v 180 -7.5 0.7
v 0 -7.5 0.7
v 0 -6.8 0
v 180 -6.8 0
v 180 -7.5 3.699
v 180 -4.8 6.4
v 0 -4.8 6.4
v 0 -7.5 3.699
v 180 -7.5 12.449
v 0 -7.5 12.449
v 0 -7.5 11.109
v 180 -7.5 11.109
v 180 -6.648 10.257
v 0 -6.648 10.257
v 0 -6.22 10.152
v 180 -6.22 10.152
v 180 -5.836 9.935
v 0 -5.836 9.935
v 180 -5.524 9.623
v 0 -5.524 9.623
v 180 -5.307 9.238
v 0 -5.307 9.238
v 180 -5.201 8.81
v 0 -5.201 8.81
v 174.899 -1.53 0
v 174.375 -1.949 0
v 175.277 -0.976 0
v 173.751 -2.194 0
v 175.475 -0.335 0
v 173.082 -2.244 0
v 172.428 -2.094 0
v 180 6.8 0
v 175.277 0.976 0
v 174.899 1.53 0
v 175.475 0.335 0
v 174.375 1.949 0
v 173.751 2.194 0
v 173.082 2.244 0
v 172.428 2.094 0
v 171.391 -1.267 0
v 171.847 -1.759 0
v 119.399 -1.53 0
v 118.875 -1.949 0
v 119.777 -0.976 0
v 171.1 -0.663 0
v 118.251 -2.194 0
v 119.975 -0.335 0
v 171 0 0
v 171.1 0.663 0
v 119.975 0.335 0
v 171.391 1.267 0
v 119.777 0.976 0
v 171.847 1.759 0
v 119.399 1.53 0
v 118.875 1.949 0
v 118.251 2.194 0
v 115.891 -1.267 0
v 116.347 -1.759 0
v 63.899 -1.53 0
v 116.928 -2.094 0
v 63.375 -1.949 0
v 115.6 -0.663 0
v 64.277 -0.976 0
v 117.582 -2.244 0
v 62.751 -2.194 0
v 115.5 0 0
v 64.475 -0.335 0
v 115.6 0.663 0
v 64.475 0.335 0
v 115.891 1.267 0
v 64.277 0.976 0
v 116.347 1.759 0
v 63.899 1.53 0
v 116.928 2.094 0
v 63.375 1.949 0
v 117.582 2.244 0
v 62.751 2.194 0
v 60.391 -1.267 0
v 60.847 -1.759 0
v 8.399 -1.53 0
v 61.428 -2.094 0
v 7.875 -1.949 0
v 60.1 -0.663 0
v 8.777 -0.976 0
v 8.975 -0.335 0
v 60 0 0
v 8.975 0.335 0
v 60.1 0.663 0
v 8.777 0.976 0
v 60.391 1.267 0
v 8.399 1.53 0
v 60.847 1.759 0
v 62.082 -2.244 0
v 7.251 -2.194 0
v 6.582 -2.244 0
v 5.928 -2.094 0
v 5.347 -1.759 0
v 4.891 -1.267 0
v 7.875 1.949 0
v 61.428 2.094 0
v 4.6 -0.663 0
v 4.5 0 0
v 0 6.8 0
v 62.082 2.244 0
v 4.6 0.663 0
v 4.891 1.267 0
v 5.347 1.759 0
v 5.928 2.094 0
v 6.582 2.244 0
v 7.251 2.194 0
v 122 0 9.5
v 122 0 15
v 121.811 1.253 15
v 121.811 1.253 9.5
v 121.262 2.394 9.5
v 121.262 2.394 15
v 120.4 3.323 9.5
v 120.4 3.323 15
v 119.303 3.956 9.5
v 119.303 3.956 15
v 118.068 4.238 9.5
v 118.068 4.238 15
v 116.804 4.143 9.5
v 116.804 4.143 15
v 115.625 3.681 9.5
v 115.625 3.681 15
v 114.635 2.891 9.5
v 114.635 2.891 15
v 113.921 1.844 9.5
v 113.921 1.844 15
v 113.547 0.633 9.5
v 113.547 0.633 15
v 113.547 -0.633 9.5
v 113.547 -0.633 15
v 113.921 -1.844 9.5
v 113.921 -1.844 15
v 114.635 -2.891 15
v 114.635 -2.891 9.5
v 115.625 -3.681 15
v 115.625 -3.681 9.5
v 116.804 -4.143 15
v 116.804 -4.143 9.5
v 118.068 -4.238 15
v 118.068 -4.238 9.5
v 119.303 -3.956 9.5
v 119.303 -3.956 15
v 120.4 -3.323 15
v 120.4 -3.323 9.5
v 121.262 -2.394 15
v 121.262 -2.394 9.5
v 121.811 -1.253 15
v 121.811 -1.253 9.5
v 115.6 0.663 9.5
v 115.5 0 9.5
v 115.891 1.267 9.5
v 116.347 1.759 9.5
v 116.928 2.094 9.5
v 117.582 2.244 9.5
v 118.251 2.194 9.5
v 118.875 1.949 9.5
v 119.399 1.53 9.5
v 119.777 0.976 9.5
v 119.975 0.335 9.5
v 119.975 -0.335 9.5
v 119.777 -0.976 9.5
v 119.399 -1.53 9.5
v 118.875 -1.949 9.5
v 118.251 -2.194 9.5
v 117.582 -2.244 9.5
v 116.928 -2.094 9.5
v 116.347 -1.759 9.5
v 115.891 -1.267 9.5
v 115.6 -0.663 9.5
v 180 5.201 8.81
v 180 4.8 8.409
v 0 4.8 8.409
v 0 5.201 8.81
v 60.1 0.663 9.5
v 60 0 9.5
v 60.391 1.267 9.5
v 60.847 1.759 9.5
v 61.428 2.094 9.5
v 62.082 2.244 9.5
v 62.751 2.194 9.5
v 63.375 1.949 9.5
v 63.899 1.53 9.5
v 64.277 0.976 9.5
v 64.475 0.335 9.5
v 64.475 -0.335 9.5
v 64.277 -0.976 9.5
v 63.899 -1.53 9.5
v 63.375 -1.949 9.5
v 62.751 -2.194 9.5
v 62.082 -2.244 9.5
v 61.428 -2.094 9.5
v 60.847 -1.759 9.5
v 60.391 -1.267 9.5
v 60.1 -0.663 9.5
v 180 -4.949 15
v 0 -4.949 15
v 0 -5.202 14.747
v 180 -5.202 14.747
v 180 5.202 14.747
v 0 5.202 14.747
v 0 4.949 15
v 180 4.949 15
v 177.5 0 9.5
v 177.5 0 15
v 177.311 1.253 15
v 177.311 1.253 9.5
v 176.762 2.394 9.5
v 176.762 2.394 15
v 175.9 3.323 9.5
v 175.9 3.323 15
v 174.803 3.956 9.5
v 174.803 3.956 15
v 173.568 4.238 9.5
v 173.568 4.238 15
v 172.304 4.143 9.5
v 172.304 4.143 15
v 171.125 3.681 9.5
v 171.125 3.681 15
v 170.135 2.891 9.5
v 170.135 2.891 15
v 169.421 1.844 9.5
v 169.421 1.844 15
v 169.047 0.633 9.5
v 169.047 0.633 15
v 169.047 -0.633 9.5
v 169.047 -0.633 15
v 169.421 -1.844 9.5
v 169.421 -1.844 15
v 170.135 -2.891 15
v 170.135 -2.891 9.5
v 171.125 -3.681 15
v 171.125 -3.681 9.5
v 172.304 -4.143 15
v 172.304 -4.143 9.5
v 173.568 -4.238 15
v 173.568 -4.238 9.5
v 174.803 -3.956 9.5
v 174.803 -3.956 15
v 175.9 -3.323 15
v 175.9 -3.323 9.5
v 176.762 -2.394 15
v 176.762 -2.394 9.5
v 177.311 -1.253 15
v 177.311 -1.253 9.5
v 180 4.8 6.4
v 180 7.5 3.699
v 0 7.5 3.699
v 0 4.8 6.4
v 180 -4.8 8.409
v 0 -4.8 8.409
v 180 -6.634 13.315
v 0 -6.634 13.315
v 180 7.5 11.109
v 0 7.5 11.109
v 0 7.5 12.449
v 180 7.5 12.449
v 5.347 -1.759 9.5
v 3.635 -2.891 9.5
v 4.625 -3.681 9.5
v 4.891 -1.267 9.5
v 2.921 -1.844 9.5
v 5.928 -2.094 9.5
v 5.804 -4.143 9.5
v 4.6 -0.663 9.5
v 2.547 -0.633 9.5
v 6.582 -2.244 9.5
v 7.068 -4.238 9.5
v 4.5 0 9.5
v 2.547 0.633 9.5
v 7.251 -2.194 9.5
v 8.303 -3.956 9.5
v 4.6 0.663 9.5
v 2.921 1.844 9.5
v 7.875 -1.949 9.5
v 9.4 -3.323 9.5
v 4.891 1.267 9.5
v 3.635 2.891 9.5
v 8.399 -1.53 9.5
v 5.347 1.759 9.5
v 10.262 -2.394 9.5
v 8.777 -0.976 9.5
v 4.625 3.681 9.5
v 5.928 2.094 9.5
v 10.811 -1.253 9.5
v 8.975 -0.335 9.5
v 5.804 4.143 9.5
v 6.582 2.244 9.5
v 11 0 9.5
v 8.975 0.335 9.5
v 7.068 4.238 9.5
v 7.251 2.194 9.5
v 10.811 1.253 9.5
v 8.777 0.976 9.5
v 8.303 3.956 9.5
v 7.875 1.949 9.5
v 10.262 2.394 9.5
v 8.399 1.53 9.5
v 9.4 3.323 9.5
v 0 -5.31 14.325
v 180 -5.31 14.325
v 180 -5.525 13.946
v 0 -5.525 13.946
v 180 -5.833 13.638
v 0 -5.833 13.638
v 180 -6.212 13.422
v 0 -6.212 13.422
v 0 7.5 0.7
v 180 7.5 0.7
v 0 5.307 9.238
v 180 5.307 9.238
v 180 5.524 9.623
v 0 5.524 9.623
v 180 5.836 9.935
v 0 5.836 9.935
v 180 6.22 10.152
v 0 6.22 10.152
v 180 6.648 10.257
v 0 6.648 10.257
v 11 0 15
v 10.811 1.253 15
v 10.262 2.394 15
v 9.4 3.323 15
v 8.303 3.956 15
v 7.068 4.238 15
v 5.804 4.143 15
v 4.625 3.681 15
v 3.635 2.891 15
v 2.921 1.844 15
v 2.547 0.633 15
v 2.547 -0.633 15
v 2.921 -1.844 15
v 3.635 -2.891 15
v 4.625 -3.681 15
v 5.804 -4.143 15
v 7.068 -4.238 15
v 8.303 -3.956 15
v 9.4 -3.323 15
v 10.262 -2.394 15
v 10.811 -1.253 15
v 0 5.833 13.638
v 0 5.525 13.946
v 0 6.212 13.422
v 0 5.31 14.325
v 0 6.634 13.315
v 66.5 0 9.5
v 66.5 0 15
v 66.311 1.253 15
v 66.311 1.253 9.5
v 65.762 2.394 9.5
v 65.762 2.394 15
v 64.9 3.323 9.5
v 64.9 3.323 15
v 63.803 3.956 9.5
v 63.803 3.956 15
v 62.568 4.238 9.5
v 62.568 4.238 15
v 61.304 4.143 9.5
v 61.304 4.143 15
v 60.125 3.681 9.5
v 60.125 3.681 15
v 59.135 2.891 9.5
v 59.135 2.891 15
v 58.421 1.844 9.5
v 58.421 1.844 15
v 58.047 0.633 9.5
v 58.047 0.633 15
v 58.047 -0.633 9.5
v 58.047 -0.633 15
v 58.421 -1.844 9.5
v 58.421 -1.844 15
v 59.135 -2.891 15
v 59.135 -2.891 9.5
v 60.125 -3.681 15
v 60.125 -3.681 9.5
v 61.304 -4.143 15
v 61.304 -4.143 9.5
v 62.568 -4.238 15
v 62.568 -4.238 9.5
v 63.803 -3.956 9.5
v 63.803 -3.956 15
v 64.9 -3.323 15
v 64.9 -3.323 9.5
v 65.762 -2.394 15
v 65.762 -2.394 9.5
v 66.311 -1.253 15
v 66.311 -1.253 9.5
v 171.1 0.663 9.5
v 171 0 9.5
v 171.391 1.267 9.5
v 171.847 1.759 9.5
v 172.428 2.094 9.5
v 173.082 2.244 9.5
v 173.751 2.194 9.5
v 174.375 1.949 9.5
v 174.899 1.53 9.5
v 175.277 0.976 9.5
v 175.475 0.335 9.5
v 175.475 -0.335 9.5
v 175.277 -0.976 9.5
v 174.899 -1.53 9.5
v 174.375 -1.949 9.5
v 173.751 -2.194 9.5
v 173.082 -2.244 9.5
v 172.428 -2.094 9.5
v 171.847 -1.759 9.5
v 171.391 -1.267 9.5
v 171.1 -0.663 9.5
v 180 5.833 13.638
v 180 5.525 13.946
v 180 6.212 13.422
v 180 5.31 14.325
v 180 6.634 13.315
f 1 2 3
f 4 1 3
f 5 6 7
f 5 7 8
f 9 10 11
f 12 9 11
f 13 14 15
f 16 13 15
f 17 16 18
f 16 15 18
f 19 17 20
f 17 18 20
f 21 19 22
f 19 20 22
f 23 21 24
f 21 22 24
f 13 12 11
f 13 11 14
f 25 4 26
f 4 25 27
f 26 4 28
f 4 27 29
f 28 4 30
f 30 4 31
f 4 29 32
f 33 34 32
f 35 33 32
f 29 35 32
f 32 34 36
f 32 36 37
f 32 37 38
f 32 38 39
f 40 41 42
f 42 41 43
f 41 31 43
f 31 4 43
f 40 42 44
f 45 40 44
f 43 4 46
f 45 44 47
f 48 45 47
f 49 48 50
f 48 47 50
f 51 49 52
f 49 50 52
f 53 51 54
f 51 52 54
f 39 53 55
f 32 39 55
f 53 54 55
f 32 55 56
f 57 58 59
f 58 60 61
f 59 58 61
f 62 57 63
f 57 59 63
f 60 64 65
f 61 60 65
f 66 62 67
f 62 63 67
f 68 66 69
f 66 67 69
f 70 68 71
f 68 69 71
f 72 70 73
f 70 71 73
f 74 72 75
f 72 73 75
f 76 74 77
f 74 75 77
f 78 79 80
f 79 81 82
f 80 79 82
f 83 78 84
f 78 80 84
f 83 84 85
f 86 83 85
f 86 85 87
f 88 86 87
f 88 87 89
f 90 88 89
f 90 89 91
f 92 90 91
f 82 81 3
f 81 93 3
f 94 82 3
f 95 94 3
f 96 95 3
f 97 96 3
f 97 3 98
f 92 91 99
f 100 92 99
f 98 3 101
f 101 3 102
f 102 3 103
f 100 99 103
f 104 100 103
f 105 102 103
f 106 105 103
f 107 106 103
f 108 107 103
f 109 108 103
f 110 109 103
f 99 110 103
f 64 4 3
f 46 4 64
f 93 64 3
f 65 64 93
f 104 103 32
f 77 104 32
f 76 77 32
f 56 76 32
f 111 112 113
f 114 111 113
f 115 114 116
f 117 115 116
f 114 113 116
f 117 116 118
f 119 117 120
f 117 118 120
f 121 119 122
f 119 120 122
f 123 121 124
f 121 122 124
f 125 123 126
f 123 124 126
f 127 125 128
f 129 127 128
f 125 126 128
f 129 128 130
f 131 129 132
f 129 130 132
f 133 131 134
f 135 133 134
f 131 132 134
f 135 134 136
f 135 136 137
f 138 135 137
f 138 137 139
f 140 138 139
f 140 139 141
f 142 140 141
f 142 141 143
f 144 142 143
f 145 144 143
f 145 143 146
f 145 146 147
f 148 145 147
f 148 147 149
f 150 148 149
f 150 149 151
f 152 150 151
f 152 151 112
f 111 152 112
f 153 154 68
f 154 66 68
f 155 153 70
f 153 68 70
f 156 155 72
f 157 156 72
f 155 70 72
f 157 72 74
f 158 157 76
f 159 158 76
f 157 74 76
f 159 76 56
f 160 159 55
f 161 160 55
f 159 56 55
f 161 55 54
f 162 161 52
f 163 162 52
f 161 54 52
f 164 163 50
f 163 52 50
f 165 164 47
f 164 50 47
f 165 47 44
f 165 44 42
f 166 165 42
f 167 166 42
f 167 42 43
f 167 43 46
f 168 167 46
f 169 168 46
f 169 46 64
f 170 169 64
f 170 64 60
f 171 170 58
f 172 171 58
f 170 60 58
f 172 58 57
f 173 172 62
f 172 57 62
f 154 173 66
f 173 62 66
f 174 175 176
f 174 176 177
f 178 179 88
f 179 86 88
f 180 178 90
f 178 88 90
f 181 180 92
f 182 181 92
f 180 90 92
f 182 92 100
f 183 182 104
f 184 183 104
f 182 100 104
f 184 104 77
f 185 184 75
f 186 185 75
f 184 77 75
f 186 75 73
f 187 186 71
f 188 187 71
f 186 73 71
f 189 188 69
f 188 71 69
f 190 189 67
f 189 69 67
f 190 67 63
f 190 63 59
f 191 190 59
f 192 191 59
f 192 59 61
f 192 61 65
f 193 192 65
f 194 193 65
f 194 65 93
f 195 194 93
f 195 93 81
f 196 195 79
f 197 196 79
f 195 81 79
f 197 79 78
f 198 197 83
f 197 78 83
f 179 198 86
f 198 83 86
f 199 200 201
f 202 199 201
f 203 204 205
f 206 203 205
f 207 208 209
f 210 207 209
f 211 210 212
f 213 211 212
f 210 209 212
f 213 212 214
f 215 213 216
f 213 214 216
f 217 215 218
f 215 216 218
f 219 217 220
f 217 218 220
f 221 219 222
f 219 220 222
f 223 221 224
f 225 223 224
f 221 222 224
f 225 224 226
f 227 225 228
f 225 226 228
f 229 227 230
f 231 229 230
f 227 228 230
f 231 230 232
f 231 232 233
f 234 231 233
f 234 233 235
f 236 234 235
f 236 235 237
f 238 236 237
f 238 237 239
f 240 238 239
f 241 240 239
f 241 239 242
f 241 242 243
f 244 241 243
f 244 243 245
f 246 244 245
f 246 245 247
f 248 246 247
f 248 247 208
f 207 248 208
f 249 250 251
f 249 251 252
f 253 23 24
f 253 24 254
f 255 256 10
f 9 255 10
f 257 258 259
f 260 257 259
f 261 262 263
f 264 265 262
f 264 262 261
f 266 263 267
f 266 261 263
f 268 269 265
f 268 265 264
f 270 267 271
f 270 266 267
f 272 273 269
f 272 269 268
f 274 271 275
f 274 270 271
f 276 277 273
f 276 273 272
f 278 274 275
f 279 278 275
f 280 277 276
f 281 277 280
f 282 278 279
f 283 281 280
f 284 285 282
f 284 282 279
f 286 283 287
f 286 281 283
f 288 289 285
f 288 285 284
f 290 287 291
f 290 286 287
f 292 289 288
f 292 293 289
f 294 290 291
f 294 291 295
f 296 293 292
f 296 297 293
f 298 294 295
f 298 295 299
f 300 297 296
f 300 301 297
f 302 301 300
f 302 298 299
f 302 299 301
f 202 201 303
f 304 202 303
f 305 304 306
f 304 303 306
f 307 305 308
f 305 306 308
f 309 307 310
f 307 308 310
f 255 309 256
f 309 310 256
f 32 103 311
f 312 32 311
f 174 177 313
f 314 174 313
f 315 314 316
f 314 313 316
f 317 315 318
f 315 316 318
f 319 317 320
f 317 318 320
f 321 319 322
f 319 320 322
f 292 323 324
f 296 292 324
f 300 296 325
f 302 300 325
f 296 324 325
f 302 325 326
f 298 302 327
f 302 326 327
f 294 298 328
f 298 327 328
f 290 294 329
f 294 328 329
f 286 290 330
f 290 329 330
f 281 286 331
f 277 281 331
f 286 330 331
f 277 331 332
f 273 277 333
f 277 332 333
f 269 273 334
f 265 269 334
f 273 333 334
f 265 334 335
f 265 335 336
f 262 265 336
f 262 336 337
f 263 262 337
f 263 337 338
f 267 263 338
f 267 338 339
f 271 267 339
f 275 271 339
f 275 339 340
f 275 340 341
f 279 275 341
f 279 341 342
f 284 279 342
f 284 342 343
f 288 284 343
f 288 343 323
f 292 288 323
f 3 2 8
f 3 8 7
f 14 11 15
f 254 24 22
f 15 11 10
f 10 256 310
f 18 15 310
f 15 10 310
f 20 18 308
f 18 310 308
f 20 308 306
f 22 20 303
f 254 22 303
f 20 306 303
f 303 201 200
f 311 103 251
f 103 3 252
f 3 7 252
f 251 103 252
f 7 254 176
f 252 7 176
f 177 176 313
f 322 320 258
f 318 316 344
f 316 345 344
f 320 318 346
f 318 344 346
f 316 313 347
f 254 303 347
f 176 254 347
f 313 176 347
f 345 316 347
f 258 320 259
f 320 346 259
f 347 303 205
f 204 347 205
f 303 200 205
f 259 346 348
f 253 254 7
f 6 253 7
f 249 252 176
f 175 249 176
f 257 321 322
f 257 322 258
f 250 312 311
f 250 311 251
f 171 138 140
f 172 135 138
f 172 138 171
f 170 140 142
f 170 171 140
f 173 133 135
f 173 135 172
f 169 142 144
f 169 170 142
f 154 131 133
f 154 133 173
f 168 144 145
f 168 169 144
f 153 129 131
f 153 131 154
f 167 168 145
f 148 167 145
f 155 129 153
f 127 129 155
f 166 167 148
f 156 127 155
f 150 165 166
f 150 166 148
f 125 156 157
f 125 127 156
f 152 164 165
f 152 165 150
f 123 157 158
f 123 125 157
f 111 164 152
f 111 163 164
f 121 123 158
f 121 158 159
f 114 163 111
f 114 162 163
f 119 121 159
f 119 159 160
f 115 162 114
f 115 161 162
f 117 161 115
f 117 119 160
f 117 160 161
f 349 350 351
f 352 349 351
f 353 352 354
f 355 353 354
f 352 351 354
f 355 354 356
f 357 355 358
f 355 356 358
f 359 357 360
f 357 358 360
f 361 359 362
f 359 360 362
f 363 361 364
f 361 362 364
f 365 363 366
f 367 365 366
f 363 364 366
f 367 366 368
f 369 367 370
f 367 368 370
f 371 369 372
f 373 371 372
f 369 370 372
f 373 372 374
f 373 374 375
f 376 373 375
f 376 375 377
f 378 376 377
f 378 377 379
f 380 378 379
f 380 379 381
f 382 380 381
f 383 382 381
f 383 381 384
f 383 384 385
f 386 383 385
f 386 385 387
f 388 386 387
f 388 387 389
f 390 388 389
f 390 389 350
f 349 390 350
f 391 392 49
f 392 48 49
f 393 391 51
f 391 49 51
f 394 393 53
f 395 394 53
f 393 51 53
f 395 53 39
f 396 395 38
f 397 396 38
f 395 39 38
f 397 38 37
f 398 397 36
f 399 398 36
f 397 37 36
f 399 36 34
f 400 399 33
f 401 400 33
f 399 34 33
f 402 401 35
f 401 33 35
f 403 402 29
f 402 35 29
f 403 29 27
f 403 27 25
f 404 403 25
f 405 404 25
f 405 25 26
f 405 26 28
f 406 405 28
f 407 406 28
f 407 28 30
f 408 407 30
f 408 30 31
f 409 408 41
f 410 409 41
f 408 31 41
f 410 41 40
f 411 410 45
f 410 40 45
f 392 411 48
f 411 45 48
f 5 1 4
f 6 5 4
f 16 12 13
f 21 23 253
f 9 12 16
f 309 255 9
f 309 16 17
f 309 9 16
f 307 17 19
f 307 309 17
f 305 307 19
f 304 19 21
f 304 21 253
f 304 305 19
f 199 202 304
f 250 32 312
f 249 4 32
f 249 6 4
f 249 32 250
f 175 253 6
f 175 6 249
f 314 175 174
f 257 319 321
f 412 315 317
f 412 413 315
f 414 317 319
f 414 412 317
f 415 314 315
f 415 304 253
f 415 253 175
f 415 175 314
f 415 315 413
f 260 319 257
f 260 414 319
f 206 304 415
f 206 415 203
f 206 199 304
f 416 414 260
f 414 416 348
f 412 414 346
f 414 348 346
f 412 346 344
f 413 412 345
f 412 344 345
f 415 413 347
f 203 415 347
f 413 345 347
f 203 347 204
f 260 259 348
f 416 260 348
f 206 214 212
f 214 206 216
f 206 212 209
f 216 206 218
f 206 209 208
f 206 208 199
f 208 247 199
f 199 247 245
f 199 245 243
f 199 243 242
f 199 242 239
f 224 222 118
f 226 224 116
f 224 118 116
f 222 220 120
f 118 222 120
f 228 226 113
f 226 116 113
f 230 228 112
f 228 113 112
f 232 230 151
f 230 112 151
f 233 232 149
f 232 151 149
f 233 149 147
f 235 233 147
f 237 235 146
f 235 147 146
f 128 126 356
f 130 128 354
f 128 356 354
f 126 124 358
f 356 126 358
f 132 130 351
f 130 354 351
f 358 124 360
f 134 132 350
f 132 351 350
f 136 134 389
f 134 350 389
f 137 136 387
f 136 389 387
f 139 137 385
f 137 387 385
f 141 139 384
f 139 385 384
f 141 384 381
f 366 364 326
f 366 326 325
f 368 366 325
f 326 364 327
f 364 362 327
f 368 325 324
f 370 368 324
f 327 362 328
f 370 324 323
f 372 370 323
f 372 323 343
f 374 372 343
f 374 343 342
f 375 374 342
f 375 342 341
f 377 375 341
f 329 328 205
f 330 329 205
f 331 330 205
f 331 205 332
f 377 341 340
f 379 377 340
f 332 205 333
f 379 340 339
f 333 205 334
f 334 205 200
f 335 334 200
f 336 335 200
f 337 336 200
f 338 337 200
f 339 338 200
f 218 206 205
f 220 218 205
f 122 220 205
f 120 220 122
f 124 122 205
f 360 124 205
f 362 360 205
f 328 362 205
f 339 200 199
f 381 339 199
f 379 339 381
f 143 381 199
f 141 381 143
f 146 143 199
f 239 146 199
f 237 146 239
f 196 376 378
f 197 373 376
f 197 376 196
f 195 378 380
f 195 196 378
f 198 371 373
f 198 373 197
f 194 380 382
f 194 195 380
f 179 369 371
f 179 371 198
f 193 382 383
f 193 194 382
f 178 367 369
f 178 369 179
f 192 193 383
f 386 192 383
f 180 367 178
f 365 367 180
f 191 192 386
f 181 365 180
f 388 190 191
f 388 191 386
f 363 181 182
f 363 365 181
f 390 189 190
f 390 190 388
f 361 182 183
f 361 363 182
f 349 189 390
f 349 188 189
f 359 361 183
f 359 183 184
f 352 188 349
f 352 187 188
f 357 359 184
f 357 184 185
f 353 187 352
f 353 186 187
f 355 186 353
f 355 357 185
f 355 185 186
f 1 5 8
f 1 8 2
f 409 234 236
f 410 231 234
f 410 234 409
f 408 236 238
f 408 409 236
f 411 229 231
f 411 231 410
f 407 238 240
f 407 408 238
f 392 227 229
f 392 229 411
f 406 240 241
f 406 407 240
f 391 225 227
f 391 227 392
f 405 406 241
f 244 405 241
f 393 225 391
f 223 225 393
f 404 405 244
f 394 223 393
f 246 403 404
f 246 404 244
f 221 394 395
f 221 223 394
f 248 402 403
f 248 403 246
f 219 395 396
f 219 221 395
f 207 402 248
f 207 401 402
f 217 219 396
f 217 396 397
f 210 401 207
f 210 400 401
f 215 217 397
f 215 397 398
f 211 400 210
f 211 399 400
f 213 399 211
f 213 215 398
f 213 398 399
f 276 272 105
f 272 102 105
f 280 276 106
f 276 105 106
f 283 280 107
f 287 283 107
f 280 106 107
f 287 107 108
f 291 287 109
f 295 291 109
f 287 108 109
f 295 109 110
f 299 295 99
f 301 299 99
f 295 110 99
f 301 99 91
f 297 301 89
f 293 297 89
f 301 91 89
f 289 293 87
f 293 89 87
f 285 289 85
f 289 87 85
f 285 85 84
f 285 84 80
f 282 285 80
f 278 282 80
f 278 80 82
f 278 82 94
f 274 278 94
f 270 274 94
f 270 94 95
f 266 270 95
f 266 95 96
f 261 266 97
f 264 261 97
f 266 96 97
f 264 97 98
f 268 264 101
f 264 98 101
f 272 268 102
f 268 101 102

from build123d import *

# Parameters (mm, degrees)
F1_DEPTH       = 180
F3_D           = 4.5
F3_CBORE_D     = 8.5
F3_CBORE_DEPTH = 5.5


with BuildPart() as f1:
    # F0 (on Right) → F1 (new body)
    with BuildSketch(Plane.YZ):
        with BuildLine():
            Line((-6.8, 0), (6.8, 0))
            Line((6.8, 0), (7.5, 0.7))
            Line((7.5, 0.7), (7.5, 3.699439))
            Line((7.5, 3.699439), (4.799805, 6.399634))
            Line((4.799805, 6.399634), (4.799805, 8.409149))
            Line((4.799805, 8.409149), (5.200758, 8.810103))
            ThreePointArc((5.200758, 8.810103), (5.668922, 9.789262), (6.648081, 10.257425))
            Line((6.648081, 10.257425), (7.5, 11.109345))
            Line((7.5, 11.109345), (7.5, 12.449454))
            Line((7.5, 12.449454), (6.634491, 13.314965))
            ThreePointArc((6.634491, 13.314965), (5.668922, 13.781617), (5.20227, 14.747186))
            Line((5.20227, 14.747186), (4.949456, 15))
            Line((4.949456, 15), (-4.949456, 15))
            Line((-4.949456, 15), (-5.20227, 14.747186))
            ThreePointArc((-5.20227, 14.747186), (-5.668922, 13.781617), (-6.634491, 13.314965))
            Line((-6.634491, 13.314965), (-7.5, 12.449454))
            Line((-7.5, 12.449454), (-7.5, 11.109345))
            Line((-7.5, 11.109345), (-6.648081, 10.257425))
            ThreePointArc((-6.648081, 10.257425), (-5.668922, 9.789262), (-5.200758, 8.810103))
            Line((-5.200758, 8.810103), (-4.799805, 8.409149))
            Line((-4.799805, 8.409149), (-4.799805, 6.399634))
            Line((-4.799805, 6.399634), (-7.5, 3.699439))
            Line((-7.5, 3.699439), (-7.5, 0.7))
            Line((-7.5, 0.7), (-6.8, 0))
        make_face()
    extrude(amount=F1_DEPTH)

    # F3 (through all)
    with Locations(Plane.XY.offset(15)):
        with Locations((6.75, 0), (62.25, 0), (117.75, 0), (173.25, 0)):
            CounterBoreHole(F3_D / 2, F3_CBORE_D / 2, F3_CBORE_DEPTH)


solid = f1.part
